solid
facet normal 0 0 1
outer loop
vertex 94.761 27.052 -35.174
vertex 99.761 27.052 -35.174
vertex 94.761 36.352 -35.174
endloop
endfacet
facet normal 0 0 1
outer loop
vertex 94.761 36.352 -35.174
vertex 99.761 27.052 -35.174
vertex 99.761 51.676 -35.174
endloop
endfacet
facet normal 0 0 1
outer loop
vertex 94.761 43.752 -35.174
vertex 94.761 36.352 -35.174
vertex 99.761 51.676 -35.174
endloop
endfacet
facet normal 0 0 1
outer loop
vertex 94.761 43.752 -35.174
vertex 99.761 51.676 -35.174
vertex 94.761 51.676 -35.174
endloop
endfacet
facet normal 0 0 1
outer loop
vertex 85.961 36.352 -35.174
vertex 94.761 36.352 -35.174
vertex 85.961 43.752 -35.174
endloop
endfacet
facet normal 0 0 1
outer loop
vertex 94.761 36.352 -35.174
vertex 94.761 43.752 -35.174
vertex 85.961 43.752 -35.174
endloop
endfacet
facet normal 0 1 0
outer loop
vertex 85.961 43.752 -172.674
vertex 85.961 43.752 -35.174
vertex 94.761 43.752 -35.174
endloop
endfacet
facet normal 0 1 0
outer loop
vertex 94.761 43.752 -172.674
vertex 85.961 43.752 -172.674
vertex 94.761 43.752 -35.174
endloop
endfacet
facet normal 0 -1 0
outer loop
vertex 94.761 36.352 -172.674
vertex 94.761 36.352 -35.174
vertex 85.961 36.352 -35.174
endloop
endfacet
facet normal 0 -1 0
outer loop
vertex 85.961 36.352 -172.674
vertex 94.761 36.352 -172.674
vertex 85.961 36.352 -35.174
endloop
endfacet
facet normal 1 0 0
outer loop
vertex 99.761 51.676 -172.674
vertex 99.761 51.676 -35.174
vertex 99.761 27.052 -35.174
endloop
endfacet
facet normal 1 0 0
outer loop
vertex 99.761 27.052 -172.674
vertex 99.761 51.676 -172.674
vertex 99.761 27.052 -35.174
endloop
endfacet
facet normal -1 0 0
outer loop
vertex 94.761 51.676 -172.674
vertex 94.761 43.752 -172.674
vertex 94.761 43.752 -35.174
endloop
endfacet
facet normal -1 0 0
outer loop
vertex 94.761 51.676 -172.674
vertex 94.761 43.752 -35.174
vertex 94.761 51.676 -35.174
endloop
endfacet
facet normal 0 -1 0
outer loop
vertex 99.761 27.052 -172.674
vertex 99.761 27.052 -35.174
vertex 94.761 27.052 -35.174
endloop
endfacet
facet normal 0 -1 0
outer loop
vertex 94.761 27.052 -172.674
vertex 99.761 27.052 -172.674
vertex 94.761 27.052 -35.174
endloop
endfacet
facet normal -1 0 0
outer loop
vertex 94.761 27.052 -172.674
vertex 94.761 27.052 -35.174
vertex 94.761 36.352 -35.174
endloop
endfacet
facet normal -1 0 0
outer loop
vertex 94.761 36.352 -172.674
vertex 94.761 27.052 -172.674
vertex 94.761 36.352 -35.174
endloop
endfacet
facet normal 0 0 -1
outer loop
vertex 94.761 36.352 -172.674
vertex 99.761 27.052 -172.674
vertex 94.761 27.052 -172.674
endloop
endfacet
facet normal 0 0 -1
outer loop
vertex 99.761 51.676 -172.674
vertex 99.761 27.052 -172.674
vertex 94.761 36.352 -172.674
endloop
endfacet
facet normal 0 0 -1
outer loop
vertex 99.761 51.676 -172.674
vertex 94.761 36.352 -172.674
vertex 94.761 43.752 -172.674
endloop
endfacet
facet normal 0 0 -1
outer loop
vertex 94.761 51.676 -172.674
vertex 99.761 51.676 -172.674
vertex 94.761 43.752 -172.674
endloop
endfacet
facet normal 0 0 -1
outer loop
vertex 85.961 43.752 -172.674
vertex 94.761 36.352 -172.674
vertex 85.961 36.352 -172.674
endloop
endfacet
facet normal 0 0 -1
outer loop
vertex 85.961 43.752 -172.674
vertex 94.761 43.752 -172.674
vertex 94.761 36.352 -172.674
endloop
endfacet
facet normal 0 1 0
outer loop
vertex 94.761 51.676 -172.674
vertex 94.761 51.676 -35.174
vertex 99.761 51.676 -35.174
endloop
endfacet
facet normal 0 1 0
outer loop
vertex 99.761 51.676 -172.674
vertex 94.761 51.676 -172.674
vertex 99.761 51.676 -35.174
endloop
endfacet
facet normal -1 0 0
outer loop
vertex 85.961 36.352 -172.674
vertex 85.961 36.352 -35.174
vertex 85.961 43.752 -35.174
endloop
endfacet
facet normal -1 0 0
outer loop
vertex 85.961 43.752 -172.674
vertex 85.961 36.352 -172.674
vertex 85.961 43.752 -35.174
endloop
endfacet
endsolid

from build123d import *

# Parameters (mm, degrees)
EXTRUDE2_DEPTH = 137.5


with BuildPart() as part:
    # Sketch1 → Extrude2 (new body)
    with BuildSketch(Plane.XY.offset(-35.173777659)):
        Polygon((85.961408719, 43.751957214), (94.761408719, 43.751957214), (94.761408719, 51.676244301), (99.761408719, 51.676244301), (99.761408719, 27.051957214), (94.761408719, 27.051957214), (94.761408719, 36.351957214), (85.961408719, 36.351957214), align=None)
    extrude(amount=-EXTRUDE2_DEPTH)


solid = part.part
